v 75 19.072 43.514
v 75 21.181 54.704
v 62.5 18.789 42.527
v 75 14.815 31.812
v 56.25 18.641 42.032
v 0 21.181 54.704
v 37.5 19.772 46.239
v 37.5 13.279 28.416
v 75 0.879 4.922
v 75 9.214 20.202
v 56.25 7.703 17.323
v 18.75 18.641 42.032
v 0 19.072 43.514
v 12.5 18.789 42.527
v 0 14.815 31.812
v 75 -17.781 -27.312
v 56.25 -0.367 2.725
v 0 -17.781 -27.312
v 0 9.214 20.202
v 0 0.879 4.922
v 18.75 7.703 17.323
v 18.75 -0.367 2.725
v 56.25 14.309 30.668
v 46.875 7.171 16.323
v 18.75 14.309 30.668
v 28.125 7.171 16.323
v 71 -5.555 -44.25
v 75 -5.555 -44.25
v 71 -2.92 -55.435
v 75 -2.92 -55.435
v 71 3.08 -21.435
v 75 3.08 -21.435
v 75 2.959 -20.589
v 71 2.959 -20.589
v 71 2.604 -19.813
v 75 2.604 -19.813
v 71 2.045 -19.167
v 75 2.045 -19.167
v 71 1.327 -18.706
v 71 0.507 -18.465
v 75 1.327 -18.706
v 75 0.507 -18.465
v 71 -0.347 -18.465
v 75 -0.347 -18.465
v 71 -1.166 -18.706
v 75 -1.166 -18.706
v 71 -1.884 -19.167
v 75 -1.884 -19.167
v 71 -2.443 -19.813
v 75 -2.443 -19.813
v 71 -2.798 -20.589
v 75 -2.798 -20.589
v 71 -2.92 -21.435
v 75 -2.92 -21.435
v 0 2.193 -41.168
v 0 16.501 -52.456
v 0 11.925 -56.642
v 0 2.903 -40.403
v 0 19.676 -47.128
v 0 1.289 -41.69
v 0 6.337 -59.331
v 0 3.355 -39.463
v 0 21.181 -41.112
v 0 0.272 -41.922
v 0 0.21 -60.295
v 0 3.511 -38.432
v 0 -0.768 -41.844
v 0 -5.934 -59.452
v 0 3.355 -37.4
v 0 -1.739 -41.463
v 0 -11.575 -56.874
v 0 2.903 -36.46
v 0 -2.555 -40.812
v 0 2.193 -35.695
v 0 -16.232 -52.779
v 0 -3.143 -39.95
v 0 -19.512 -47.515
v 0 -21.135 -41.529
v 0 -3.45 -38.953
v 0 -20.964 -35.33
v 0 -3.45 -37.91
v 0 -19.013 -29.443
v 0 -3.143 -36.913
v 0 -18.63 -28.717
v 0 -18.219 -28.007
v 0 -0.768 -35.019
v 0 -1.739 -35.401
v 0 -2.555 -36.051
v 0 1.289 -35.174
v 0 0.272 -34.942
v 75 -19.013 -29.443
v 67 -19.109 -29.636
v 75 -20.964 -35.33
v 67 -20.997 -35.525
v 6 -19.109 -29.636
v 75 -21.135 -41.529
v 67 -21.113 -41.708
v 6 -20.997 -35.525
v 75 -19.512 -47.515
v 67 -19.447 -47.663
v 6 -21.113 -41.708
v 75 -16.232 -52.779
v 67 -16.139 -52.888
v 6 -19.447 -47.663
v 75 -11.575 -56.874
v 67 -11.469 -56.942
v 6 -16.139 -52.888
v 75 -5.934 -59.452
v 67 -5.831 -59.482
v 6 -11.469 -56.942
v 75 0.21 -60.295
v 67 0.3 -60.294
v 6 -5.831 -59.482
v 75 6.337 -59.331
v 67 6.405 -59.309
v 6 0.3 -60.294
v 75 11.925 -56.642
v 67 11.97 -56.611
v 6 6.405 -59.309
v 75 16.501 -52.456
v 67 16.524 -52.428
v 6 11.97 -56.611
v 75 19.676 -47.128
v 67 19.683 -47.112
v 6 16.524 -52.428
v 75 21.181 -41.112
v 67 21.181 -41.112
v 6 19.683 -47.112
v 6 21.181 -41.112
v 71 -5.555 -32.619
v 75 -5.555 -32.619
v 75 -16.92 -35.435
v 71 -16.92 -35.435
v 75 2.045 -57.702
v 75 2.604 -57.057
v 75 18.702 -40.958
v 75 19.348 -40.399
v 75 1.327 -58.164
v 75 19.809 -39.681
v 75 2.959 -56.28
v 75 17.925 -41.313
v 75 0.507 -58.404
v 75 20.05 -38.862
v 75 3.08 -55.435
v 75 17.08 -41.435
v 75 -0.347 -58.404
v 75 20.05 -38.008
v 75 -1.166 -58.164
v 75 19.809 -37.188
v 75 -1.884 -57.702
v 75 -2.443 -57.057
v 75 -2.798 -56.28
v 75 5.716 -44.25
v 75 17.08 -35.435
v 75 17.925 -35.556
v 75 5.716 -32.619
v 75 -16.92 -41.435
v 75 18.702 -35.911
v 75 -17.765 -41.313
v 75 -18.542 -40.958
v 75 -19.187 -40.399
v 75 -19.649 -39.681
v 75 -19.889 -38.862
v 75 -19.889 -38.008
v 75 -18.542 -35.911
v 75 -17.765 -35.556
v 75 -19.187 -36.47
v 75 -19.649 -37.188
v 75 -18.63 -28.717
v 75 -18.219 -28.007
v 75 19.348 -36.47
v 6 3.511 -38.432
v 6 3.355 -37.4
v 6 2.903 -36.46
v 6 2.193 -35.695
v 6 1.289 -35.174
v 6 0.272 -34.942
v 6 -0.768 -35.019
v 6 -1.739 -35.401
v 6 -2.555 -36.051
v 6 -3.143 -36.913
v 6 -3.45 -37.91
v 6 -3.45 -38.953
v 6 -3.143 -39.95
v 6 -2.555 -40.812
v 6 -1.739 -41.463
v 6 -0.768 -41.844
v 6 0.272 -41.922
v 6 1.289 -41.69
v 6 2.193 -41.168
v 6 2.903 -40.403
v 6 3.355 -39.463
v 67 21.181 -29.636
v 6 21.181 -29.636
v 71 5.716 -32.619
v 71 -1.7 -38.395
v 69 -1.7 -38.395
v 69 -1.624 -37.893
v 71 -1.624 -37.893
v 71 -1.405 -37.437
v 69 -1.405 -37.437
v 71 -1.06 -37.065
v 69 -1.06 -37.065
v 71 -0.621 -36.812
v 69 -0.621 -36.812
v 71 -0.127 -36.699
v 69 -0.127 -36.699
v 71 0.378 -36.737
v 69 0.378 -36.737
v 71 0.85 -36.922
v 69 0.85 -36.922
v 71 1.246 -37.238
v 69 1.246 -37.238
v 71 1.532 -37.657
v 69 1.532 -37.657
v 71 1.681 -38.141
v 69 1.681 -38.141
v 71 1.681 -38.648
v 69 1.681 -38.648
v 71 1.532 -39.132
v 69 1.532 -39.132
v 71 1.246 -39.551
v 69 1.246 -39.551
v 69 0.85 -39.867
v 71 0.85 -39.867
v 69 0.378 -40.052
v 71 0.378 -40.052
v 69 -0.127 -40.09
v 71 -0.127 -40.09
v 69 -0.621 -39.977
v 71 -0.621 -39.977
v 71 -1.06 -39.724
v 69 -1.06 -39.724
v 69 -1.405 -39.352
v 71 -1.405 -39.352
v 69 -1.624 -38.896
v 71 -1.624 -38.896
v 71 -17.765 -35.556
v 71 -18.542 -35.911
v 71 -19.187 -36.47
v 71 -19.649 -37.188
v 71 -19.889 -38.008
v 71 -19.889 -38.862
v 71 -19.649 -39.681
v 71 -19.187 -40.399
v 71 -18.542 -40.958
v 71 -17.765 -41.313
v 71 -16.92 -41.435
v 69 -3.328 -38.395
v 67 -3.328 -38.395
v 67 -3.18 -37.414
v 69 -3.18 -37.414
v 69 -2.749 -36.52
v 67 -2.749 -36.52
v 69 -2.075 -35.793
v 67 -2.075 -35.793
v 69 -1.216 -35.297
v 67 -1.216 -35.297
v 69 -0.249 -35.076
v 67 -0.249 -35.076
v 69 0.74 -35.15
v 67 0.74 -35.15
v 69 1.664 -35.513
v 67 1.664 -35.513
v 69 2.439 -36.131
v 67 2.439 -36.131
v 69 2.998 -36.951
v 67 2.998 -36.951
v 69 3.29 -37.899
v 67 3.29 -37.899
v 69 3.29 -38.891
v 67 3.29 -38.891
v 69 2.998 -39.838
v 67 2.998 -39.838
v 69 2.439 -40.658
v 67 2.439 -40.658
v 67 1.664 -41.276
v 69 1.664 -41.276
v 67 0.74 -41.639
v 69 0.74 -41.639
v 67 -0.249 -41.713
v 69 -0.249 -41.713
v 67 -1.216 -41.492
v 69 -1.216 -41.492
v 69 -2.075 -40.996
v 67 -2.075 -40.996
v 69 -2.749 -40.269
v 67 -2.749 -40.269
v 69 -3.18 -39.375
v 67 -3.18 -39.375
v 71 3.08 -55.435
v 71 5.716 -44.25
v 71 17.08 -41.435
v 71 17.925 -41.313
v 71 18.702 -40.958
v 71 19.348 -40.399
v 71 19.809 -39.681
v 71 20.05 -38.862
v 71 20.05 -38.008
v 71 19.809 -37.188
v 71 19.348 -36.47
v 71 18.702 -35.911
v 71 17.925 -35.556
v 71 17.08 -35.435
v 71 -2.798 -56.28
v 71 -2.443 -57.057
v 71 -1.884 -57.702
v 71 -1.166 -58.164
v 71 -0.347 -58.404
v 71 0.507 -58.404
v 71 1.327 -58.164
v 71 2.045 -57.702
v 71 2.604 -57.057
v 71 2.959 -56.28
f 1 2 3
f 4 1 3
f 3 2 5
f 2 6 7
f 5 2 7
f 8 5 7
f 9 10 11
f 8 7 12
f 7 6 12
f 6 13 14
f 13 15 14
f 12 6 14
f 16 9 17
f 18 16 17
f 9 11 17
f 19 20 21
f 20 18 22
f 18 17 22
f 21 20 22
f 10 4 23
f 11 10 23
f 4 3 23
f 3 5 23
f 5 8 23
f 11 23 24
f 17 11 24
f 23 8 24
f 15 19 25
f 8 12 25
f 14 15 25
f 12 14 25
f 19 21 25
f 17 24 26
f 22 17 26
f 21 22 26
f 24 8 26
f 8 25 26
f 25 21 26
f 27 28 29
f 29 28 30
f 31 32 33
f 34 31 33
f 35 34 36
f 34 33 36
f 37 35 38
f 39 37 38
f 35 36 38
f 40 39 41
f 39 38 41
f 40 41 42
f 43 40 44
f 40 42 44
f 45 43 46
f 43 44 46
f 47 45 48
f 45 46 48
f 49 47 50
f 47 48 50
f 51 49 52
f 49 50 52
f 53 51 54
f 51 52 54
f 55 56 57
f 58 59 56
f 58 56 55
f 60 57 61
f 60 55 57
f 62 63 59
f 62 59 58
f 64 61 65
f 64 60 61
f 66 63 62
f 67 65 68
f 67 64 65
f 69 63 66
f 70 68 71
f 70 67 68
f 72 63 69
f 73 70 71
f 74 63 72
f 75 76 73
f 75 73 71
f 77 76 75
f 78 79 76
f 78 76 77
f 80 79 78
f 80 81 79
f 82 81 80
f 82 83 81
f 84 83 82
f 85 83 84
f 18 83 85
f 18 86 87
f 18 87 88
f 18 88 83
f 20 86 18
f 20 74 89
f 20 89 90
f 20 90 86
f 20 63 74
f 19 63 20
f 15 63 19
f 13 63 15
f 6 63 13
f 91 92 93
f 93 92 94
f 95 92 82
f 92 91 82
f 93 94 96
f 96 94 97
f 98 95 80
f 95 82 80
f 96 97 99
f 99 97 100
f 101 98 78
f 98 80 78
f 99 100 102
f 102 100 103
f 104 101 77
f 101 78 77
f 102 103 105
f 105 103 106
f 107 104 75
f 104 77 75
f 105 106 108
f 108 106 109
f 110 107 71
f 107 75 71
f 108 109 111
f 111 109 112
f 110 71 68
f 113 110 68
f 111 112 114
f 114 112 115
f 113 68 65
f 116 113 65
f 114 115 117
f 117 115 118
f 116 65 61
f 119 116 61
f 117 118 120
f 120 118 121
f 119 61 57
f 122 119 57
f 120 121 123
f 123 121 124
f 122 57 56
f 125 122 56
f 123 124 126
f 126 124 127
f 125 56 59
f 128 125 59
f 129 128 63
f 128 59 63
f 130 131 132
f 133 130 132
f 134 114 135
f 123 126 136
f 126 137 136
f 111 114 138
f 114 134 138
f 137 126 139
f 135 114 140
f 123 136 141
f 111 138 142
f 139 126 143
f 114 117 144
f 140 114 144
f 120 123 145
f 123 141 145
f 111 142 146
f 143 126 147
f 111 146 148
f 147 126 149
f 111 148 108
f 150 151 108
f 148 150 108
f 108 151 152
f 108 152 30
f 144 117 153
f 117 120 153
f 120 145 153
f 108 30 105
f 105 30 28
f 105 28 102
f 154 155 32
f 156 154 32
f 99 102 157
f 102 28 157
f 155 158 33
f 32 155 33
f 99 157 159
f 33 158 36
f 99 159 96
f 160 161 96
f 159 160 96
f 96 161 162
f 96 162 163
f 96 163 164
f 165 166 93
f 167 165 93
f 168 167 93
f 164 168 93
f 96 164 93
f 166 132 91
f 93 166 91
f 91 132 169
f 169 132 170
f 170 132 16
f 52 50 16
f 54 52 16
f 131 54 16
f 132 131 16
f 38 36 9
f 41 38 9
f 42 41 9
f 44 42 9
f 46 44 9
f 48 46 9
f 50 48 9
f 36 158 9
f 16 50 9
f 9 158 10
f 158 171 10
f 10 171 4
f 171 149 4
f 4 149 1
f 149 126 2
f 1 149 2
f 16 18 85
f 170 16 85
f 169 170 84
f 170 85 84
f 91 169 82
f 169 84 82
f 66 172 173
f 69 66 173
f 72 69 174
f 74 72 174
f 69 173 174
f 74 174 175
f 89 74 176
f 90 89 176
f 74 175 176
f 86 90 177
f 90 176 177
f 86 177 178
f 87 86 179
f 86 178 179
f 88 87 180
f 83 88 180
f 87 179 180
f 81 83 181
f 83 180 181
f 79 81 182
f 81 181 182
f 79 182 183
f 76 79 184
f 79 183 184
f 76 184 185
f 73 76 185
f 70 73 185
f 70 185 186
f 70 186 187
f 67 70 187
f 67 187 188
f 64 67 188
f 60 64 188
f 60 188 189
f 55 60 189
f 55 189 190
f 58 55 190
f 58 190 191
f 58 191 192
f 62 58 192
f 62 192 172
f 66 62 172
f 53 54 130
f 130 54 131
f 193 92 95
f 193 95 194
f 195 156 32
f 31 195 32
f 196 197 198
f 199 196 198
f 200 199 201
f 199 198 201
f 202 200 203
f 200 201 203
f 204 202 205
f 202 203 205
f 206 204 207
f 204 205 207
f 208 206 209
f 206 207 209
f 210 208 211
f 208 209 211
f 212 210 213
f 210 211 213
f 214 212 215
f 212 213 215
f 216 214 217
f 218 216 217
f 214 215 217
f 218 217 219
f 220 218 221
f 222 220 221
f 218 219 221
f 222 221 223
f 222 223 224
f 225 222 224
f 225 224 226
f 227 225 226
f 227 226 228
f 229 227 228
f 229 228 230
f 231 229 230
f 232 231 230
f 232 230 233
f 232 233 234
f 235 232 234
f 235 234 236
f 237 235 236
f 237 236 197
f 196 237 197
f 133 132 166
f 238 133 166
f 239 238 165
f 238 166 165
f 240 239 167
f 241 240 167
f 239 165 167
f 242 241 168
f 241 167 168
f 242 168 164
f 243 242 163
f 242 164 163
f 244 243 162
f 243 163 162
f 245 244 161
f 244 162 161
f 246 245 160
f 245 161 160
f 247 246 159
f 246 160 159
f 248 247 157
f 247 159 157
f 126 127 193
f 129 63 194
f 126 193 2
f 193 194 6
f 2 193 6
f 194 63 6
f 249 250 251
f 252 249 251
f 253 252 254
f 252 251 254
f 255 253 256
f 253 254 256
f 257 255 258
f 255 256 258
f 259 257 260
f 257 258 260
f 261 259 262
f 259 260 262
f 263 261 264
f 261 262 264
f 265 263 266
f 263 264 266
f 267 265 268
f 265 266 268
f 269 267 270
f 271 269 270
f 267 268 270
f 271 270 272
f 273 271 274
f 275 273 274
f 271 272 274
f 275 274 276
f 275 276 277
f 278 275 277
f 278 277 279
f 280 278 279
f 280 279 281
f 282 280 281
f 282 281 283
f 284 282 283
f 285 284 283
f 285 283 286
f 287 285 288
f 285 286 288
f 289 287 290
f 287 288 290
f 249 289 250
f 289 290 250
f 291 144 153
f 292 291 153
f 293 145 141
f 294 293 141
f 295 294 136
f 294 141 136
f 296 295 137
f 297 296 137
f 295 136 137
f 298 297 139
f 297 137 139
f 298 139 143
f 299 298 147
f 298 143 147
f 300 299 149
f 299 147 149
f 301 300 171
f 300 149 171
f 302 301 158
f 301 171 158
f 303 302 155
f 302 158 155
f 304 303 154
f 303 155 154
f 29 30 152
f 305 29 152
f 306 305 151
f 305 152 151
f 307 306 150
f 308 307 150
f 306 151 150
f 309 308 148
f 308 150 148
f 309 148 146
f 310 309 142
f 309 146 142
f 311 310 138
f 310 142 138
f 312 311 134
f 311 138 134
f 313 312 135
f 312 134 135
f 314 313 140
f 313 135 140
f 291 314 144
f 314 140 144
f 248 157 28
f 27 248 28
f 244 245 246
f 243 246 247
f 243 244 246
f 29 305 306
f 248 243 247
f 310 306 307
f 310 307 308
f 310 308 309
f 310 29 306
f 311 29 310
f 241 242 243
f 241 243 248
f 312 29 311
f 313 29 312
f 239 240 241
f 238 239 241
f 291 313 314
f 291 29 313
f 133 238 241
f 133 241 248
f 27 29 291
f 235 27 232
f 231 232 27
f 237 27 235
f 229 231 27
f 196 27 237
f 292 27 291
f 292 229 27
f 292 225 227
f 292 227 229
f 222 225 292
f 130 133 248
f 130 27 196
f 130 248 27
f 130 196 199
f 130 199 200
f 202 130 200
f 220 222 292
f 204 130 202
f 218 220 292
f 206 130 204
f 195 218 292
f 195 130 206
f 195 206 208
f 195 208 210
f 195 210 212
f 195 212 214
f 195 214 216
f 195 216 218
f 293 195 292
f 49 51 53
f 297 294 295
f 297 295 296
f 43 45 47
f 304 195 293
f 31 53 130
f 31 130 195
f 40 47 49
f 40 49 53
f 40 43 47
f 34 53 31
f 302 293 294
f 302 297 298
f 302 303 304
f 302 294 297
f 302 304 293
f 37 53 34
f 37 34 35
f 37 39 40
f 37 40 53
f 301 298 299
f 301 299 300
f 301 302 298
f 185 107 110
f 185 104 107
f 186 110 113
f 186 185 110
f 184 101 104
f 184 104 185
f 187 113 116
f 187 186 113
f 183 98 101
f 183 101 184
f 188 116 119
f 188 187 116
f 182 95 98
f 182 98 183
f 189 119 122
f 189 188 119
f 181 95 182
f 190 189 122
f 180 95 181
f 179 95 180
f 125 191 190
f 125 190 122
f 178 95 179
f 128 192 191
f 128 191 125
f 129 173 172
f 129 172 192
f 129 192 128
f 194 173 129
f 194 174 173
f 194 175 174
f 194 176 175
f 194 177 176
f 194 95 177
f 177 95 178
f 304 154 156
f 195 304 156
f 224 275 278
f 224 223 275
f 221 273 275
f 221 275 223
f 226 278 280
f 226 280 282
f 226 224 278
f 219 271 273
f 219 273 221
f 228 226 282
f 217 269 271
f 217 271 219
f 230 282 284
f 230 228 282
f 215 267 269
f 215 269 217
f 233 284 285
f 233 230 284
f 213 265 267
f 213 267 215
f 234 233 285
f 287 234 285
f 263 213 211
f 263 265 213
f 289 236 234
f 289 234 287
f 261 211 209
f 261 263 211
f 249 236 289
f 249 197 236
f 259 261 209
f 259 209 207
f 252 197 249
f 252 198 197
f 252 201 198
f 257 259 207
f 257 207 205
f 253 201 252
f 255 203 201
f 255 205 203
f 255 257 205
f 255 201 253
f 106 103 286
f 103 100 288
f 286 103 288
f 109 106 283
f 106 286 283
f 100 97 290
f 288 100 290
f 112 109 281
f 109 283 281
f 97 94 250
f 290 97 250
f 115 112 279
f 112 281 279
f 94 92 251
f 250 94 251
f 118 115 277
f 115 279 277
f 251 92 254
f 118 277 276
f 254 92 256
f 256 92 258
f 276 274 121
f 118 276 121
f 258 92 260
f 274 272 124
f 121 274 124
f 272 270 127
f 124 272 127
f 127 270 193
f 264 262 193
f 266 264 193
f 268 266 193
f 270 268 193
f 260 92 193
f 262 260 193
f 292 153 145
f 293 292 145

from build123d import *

# Parameters (mm, degrees)
F1_DEPTH  = 75
F3_DEPTH  = 4
F5_W      = 61.9195103645
F5_H      = 37.6517623663
F6_DEPTH  = 17
F7_DEPTH  = 44
F9_D      = 7
F9_DEPTH  = 15
F9_TIP    = 2.1030121666
F10_R     = 3.3275648112
F10_R_2   = 1.7
F11_DEPTH = 2
F12_DEPTH = 25.4


with BuildPart() as f1:
    # F0 (on Right) → F1 (new body)
    with BuildSketch(Plane.YZ):
        with BuildLine():
            add(Edge.make_bspline(
                [(-17.7810950981, -27.3124240728), (-18.19174778, -28.0218574236), (-18.6022967338, -28.732065323), (-19.0125334596, -29.4428684699)],
                knots=[0.9798659686, 0.9798659686, 0.9798659686, 0.9798659686, 1, 1, 1, 1], degree=3))
            ThreePointArc((-17.7810950981, -27.3124240728), (-18.4276280065, -28.3598353366), (-19.0125334596, -29.4428684699))
        make_face()
        with BuildLine():
            add(Edge.make_bspline(
                [(21.1806873749, 54.7040760765), (20.2999017837, 46.0225748891), (14.3499977593, 26.8402827287), (-5.7827936538, -6.5844571681), (-17.7810950981, -27.3124240728)],
                knots=[0, 0, 0, 0, 0.3915971259, 0.9798659686, 0.9798659686, 0.9798659686, 0.9798659686], degree=3))
            add(Edge.make_bspline(
                [(-17.7810950981, -27.3124240728), (-18.19174778, -28.0218574236), (-18.6022967338, -28.732065323), (-19.0125334596, -29.4428684699)],
                knots=[0.9798659686, 0.9798659686, 0.9798659686, 0.9798659686, 1, 1, 1, 1], degree=3))
            ThreePointArc((-19.0125334596, -29.4428684699), (-5.934227846, -59.4519469715), (21.1806873749, -41.1116022965))
            Line((21.1806873749, -41.1116022965), (21.1806873749, 54.7040760765))
        make_face()
    extrude(amount=F1_DEPTH)

    # F2 (on face) → F3 (cut)
    with BuildSketch(Plane.YZ.offset(75)):
        with BuildLine():
            Line((5.715811355, -44.2500978365), (17.0802870953, -41.4346371949))
            ThreePointArc((17.0802870953, -41.4346371949), (20.0802870953, -38.4346371949), (17.0802870953, -35.4346371949))
            Line((17.0802870953, -35.4346371949), (5.715811355, -32.6191765533))
            Line((5.715811355, -32.6191765533), (3.0802870953, -21.4346371949))
            ThreePointArc((3.0802870953, -21.4346371949), (0.0802870953, -18.4346371949), (-2.9197129047, -21.4346371949))
            Line((-2.9197129047, -21.4346371949), (-5.5552371643, -32.6191765533))
            Line((-5.5552371643, -32.6191765533), (-16.9197129047, -35.4346371949))
            ThreePointArc((-16.9197129047, -35.4346371949), (-19.9197129047, -38.4346371949), (-16.9197129047, -41.4346371949))
            Line((-16.9197129047, -41.4346371949), (-5.5552371643, -44.2500978365))
            Line((-5.5552371643, -44.2500978365), (-2.9197129047, -55.4346371949))
            ThreePointArc((-2.9197129047, -55.4346371949), (0.0802870953, -58.4346371949), (3.0802870953, -55.4346371949))
            Line((3.0802870953, -55.4346371949), (5.715811355, -44.2500978365))
        make_face()
    extrude(amount=-F3_DEPTH, mode=Mode.SUBTRACT)

    # F5 (on offset) → F6 (cut)
    with BuildSketch(Plane.YZ.offset(50)):
        with Locations((0, -48.4619401395)):
            Rectangle(F5_W, F5_H)
    extrude(amount=F6_DEPTH, mode=Mode.SUBTRACT)

    # F5 (on offset) → F7 (cut)
    with BuildSketch(Plane.YZ.offset(50)):
        with Locations((0, -48.4619401395)):
            Rectangle(F5_W, F5_H)
    extrude(amount=-F7_DEPTH, mode=Mode.SUBTRACT)

    # F9
    with Locations(Plane(origin=(0, 0, 0), x_dir=(0, -1, 0), z_dir=(-1, 0, 0))):
        with Locations((-0.0107965604, -38.4317387827)):
            Hole(F9_D / 2, depth=F9_DEPTH)
            with Locations((0, 0, -(F9_DEPTH + F9_TIP / 2))):  # 118° drill point
                Cone(0, F9_D / 2, F9_TIP, mode=Mode.SUBTRACT)

    # F10 (on face) → F11 (cut)
    with BuildSketch(Plane(origin=(67, 0, 0), x_dir=(0, -1, 0), z_dir=(-1, 0, 0))):
        with Locations((0, -38.3945740759)):
            Circle(F10_R)
        with Locations((0, -38.3945740759)):
            Circle(F10_R_2, mode=Mode.SUBTRACT)
    extrude(amount=-F11_DEPTH, mode=Mode.SUBTRACT)

    # F10 (on face) → F12 (cut)
    with BuildSketch(Plane(origin=(67, 0, 0), x_dir=(0, -1, 0), z_dir=(-1, 0, 0))):
        with Locations((0, -38.3945740759)):
            Circle(F10_R_2)
    extrude(amount=-F12_DEPTH, mode=Mode.SUBTRACT)


solid = f1.part
